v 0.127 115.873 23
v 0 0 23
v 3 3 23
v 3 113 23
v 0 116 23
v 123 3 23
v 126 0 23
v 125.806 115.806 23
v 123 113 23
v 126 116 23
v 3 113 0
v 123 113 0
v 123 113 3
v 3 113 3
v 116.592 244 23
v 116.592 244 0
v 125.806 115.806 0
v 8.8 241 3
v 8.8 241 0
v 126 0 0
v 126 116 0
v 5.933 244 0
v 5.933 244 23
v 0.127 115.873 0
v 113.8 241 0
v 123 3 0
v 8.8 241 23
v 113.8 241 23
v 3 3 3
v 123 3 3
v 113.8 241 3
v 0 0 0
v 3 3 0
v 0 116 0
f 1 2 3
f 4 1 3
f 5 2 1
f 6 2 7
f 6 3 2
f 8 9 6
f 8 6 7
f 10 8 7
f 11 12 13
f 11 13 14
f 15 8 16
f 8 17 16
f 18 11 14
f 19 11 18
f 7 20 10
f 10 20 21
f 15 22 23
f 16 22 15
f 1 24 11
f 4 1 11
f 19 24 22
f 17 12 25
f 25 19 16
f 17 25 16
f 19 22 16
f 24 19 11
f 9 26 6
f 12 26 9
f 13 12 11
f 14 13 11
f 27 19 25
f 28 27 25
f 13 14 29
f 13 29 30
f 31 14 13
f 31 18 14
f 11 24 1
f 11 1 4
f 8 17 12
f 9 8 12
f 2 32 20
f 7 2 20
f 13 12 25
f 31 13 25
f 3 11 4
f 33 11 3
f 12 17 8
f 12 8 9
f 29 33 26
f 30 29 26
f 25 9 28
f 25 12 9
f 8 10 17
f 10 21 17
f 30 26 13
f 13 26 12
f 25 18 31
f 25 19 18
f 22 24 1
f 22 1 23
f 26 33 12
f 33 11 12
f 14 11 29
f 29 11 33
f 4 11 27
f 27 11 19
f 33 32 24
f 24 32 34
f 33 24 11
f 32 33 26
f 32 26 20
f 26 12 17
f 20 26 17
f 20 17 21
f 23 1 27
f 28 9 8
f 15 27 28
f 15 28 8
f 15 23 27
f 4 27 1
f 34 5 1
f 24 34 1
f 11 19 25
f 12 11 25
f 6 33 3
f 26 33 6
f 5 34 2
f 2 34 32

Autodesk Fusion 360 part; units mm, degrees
sketch "Sketch1" plane through (0, 0, 0) normal (0, 0, 1) x (1, 0, 0) in component "cabin_back_lid"
  line L0 (3, 3) -> (123, 3)
  line L1 (123, 3) -> (123, 113)
  line L2 (123, 113) -> (3, 113)
  line L3 (3, 113) -> (3, 3)
  line L4 (126, 0) -> (126, 116)
  line L5 (126, 116) -> (0, 116)
  line L6 (0, 116) -> (0, 0)
  line L7 (0, 0) -> (126, 0)
  line L8 (0, 116) -> (3, 113)
  line L9 (126, 116) -> (123, 113)
  line L10 (63, 116) -> (63, 266) construction
  line L11 (8.8003, 241) -> (113.8003, 241)
  line L12 (3, 113) -> (8.8003, 241)
  line L13 (123, 113) -> (113.8003, 241)
  line L14 (0.0031, 113.1358) -> (5.9332, 244)
  line L15 (5.9332, 244) -> (116.5924, 244)
  line L16 (125.9923, 113.2151) -> (116.5924, 244)
  dimension "d1" = 120
  dimension "d2" = 110
  dimension "d3" = 3
  dimension "d12" = 150
  dimension "d15" = 105
  dimension "d16" = 125
  dimension "d17" = 3
extrude "Extrude3" add sketch "Sketch1" along normal blind 23 contours L5 L8 L12 L14 | L5 L9 L13 L16 | L5 L11 L12 L13 L14 L15 L16 makes body 1 in component "cabin_back_lid"
extrude "Extrude2" add sketch "Sketch1" along normal blind 23 separate body contours L0 L1 L3 L4 L6 L7 L8 L9 makes body 2 in component "cabin_back_lid"
extrude "Extrude1" add sketch "Sketch1" along normal blind 3 separate body contours L0 L1 L2 L3 makes body 3 in component "cabin_back_lid"
extrude "Extrude4" add sketch "Sketch1" along normal blind 3 separate body contours L2 L5 L12 L13 | L5 L11 L12 L13 makes body 4 in component "cabin_back_lid"
copy_body "CutPasteBodies1" bodies 4 removing the originals makes body 5 in component "cabin_front_lid"
copy_body "CutPasteBodies2" bodies 1 removing the originals makes body 6 in component "cabin_front_lid"
component "cabin_back_lid" placed x (1, 0, 0) y (0, 1, 0) z (0, 0, 1) at (0, 0, 0)
component "cabin_front_lid" placed x (1, 0, 0) y (0, 1, 0) z (0, 0, 1) at (0, 0, 0)
equation "d1 = back_cabin_width"
equation "d2 = back_cabin_length"
equation "back_cabin_length = 110 mm"
equation "back_cabin_width = 120 mm"
equation "cabin_wall_thickness = 3 mm"
equation "cabin_lid_height = 20 mm"
equation "d8 = cabin_wall_thickness"
equation "d10 = cabin_lid_height + cabin_wall_thickness"
equation "front_cabin_length = 125 mm"
equation "front_cabin_width = 105 mm"
equation "d15 = front_cabin_width"
equation "d16 = front_cabin_length"
equation "d18 = cabin_lid_height + cabin_wall_thickness"
equation "d20 = cabin_wall_thickness"
